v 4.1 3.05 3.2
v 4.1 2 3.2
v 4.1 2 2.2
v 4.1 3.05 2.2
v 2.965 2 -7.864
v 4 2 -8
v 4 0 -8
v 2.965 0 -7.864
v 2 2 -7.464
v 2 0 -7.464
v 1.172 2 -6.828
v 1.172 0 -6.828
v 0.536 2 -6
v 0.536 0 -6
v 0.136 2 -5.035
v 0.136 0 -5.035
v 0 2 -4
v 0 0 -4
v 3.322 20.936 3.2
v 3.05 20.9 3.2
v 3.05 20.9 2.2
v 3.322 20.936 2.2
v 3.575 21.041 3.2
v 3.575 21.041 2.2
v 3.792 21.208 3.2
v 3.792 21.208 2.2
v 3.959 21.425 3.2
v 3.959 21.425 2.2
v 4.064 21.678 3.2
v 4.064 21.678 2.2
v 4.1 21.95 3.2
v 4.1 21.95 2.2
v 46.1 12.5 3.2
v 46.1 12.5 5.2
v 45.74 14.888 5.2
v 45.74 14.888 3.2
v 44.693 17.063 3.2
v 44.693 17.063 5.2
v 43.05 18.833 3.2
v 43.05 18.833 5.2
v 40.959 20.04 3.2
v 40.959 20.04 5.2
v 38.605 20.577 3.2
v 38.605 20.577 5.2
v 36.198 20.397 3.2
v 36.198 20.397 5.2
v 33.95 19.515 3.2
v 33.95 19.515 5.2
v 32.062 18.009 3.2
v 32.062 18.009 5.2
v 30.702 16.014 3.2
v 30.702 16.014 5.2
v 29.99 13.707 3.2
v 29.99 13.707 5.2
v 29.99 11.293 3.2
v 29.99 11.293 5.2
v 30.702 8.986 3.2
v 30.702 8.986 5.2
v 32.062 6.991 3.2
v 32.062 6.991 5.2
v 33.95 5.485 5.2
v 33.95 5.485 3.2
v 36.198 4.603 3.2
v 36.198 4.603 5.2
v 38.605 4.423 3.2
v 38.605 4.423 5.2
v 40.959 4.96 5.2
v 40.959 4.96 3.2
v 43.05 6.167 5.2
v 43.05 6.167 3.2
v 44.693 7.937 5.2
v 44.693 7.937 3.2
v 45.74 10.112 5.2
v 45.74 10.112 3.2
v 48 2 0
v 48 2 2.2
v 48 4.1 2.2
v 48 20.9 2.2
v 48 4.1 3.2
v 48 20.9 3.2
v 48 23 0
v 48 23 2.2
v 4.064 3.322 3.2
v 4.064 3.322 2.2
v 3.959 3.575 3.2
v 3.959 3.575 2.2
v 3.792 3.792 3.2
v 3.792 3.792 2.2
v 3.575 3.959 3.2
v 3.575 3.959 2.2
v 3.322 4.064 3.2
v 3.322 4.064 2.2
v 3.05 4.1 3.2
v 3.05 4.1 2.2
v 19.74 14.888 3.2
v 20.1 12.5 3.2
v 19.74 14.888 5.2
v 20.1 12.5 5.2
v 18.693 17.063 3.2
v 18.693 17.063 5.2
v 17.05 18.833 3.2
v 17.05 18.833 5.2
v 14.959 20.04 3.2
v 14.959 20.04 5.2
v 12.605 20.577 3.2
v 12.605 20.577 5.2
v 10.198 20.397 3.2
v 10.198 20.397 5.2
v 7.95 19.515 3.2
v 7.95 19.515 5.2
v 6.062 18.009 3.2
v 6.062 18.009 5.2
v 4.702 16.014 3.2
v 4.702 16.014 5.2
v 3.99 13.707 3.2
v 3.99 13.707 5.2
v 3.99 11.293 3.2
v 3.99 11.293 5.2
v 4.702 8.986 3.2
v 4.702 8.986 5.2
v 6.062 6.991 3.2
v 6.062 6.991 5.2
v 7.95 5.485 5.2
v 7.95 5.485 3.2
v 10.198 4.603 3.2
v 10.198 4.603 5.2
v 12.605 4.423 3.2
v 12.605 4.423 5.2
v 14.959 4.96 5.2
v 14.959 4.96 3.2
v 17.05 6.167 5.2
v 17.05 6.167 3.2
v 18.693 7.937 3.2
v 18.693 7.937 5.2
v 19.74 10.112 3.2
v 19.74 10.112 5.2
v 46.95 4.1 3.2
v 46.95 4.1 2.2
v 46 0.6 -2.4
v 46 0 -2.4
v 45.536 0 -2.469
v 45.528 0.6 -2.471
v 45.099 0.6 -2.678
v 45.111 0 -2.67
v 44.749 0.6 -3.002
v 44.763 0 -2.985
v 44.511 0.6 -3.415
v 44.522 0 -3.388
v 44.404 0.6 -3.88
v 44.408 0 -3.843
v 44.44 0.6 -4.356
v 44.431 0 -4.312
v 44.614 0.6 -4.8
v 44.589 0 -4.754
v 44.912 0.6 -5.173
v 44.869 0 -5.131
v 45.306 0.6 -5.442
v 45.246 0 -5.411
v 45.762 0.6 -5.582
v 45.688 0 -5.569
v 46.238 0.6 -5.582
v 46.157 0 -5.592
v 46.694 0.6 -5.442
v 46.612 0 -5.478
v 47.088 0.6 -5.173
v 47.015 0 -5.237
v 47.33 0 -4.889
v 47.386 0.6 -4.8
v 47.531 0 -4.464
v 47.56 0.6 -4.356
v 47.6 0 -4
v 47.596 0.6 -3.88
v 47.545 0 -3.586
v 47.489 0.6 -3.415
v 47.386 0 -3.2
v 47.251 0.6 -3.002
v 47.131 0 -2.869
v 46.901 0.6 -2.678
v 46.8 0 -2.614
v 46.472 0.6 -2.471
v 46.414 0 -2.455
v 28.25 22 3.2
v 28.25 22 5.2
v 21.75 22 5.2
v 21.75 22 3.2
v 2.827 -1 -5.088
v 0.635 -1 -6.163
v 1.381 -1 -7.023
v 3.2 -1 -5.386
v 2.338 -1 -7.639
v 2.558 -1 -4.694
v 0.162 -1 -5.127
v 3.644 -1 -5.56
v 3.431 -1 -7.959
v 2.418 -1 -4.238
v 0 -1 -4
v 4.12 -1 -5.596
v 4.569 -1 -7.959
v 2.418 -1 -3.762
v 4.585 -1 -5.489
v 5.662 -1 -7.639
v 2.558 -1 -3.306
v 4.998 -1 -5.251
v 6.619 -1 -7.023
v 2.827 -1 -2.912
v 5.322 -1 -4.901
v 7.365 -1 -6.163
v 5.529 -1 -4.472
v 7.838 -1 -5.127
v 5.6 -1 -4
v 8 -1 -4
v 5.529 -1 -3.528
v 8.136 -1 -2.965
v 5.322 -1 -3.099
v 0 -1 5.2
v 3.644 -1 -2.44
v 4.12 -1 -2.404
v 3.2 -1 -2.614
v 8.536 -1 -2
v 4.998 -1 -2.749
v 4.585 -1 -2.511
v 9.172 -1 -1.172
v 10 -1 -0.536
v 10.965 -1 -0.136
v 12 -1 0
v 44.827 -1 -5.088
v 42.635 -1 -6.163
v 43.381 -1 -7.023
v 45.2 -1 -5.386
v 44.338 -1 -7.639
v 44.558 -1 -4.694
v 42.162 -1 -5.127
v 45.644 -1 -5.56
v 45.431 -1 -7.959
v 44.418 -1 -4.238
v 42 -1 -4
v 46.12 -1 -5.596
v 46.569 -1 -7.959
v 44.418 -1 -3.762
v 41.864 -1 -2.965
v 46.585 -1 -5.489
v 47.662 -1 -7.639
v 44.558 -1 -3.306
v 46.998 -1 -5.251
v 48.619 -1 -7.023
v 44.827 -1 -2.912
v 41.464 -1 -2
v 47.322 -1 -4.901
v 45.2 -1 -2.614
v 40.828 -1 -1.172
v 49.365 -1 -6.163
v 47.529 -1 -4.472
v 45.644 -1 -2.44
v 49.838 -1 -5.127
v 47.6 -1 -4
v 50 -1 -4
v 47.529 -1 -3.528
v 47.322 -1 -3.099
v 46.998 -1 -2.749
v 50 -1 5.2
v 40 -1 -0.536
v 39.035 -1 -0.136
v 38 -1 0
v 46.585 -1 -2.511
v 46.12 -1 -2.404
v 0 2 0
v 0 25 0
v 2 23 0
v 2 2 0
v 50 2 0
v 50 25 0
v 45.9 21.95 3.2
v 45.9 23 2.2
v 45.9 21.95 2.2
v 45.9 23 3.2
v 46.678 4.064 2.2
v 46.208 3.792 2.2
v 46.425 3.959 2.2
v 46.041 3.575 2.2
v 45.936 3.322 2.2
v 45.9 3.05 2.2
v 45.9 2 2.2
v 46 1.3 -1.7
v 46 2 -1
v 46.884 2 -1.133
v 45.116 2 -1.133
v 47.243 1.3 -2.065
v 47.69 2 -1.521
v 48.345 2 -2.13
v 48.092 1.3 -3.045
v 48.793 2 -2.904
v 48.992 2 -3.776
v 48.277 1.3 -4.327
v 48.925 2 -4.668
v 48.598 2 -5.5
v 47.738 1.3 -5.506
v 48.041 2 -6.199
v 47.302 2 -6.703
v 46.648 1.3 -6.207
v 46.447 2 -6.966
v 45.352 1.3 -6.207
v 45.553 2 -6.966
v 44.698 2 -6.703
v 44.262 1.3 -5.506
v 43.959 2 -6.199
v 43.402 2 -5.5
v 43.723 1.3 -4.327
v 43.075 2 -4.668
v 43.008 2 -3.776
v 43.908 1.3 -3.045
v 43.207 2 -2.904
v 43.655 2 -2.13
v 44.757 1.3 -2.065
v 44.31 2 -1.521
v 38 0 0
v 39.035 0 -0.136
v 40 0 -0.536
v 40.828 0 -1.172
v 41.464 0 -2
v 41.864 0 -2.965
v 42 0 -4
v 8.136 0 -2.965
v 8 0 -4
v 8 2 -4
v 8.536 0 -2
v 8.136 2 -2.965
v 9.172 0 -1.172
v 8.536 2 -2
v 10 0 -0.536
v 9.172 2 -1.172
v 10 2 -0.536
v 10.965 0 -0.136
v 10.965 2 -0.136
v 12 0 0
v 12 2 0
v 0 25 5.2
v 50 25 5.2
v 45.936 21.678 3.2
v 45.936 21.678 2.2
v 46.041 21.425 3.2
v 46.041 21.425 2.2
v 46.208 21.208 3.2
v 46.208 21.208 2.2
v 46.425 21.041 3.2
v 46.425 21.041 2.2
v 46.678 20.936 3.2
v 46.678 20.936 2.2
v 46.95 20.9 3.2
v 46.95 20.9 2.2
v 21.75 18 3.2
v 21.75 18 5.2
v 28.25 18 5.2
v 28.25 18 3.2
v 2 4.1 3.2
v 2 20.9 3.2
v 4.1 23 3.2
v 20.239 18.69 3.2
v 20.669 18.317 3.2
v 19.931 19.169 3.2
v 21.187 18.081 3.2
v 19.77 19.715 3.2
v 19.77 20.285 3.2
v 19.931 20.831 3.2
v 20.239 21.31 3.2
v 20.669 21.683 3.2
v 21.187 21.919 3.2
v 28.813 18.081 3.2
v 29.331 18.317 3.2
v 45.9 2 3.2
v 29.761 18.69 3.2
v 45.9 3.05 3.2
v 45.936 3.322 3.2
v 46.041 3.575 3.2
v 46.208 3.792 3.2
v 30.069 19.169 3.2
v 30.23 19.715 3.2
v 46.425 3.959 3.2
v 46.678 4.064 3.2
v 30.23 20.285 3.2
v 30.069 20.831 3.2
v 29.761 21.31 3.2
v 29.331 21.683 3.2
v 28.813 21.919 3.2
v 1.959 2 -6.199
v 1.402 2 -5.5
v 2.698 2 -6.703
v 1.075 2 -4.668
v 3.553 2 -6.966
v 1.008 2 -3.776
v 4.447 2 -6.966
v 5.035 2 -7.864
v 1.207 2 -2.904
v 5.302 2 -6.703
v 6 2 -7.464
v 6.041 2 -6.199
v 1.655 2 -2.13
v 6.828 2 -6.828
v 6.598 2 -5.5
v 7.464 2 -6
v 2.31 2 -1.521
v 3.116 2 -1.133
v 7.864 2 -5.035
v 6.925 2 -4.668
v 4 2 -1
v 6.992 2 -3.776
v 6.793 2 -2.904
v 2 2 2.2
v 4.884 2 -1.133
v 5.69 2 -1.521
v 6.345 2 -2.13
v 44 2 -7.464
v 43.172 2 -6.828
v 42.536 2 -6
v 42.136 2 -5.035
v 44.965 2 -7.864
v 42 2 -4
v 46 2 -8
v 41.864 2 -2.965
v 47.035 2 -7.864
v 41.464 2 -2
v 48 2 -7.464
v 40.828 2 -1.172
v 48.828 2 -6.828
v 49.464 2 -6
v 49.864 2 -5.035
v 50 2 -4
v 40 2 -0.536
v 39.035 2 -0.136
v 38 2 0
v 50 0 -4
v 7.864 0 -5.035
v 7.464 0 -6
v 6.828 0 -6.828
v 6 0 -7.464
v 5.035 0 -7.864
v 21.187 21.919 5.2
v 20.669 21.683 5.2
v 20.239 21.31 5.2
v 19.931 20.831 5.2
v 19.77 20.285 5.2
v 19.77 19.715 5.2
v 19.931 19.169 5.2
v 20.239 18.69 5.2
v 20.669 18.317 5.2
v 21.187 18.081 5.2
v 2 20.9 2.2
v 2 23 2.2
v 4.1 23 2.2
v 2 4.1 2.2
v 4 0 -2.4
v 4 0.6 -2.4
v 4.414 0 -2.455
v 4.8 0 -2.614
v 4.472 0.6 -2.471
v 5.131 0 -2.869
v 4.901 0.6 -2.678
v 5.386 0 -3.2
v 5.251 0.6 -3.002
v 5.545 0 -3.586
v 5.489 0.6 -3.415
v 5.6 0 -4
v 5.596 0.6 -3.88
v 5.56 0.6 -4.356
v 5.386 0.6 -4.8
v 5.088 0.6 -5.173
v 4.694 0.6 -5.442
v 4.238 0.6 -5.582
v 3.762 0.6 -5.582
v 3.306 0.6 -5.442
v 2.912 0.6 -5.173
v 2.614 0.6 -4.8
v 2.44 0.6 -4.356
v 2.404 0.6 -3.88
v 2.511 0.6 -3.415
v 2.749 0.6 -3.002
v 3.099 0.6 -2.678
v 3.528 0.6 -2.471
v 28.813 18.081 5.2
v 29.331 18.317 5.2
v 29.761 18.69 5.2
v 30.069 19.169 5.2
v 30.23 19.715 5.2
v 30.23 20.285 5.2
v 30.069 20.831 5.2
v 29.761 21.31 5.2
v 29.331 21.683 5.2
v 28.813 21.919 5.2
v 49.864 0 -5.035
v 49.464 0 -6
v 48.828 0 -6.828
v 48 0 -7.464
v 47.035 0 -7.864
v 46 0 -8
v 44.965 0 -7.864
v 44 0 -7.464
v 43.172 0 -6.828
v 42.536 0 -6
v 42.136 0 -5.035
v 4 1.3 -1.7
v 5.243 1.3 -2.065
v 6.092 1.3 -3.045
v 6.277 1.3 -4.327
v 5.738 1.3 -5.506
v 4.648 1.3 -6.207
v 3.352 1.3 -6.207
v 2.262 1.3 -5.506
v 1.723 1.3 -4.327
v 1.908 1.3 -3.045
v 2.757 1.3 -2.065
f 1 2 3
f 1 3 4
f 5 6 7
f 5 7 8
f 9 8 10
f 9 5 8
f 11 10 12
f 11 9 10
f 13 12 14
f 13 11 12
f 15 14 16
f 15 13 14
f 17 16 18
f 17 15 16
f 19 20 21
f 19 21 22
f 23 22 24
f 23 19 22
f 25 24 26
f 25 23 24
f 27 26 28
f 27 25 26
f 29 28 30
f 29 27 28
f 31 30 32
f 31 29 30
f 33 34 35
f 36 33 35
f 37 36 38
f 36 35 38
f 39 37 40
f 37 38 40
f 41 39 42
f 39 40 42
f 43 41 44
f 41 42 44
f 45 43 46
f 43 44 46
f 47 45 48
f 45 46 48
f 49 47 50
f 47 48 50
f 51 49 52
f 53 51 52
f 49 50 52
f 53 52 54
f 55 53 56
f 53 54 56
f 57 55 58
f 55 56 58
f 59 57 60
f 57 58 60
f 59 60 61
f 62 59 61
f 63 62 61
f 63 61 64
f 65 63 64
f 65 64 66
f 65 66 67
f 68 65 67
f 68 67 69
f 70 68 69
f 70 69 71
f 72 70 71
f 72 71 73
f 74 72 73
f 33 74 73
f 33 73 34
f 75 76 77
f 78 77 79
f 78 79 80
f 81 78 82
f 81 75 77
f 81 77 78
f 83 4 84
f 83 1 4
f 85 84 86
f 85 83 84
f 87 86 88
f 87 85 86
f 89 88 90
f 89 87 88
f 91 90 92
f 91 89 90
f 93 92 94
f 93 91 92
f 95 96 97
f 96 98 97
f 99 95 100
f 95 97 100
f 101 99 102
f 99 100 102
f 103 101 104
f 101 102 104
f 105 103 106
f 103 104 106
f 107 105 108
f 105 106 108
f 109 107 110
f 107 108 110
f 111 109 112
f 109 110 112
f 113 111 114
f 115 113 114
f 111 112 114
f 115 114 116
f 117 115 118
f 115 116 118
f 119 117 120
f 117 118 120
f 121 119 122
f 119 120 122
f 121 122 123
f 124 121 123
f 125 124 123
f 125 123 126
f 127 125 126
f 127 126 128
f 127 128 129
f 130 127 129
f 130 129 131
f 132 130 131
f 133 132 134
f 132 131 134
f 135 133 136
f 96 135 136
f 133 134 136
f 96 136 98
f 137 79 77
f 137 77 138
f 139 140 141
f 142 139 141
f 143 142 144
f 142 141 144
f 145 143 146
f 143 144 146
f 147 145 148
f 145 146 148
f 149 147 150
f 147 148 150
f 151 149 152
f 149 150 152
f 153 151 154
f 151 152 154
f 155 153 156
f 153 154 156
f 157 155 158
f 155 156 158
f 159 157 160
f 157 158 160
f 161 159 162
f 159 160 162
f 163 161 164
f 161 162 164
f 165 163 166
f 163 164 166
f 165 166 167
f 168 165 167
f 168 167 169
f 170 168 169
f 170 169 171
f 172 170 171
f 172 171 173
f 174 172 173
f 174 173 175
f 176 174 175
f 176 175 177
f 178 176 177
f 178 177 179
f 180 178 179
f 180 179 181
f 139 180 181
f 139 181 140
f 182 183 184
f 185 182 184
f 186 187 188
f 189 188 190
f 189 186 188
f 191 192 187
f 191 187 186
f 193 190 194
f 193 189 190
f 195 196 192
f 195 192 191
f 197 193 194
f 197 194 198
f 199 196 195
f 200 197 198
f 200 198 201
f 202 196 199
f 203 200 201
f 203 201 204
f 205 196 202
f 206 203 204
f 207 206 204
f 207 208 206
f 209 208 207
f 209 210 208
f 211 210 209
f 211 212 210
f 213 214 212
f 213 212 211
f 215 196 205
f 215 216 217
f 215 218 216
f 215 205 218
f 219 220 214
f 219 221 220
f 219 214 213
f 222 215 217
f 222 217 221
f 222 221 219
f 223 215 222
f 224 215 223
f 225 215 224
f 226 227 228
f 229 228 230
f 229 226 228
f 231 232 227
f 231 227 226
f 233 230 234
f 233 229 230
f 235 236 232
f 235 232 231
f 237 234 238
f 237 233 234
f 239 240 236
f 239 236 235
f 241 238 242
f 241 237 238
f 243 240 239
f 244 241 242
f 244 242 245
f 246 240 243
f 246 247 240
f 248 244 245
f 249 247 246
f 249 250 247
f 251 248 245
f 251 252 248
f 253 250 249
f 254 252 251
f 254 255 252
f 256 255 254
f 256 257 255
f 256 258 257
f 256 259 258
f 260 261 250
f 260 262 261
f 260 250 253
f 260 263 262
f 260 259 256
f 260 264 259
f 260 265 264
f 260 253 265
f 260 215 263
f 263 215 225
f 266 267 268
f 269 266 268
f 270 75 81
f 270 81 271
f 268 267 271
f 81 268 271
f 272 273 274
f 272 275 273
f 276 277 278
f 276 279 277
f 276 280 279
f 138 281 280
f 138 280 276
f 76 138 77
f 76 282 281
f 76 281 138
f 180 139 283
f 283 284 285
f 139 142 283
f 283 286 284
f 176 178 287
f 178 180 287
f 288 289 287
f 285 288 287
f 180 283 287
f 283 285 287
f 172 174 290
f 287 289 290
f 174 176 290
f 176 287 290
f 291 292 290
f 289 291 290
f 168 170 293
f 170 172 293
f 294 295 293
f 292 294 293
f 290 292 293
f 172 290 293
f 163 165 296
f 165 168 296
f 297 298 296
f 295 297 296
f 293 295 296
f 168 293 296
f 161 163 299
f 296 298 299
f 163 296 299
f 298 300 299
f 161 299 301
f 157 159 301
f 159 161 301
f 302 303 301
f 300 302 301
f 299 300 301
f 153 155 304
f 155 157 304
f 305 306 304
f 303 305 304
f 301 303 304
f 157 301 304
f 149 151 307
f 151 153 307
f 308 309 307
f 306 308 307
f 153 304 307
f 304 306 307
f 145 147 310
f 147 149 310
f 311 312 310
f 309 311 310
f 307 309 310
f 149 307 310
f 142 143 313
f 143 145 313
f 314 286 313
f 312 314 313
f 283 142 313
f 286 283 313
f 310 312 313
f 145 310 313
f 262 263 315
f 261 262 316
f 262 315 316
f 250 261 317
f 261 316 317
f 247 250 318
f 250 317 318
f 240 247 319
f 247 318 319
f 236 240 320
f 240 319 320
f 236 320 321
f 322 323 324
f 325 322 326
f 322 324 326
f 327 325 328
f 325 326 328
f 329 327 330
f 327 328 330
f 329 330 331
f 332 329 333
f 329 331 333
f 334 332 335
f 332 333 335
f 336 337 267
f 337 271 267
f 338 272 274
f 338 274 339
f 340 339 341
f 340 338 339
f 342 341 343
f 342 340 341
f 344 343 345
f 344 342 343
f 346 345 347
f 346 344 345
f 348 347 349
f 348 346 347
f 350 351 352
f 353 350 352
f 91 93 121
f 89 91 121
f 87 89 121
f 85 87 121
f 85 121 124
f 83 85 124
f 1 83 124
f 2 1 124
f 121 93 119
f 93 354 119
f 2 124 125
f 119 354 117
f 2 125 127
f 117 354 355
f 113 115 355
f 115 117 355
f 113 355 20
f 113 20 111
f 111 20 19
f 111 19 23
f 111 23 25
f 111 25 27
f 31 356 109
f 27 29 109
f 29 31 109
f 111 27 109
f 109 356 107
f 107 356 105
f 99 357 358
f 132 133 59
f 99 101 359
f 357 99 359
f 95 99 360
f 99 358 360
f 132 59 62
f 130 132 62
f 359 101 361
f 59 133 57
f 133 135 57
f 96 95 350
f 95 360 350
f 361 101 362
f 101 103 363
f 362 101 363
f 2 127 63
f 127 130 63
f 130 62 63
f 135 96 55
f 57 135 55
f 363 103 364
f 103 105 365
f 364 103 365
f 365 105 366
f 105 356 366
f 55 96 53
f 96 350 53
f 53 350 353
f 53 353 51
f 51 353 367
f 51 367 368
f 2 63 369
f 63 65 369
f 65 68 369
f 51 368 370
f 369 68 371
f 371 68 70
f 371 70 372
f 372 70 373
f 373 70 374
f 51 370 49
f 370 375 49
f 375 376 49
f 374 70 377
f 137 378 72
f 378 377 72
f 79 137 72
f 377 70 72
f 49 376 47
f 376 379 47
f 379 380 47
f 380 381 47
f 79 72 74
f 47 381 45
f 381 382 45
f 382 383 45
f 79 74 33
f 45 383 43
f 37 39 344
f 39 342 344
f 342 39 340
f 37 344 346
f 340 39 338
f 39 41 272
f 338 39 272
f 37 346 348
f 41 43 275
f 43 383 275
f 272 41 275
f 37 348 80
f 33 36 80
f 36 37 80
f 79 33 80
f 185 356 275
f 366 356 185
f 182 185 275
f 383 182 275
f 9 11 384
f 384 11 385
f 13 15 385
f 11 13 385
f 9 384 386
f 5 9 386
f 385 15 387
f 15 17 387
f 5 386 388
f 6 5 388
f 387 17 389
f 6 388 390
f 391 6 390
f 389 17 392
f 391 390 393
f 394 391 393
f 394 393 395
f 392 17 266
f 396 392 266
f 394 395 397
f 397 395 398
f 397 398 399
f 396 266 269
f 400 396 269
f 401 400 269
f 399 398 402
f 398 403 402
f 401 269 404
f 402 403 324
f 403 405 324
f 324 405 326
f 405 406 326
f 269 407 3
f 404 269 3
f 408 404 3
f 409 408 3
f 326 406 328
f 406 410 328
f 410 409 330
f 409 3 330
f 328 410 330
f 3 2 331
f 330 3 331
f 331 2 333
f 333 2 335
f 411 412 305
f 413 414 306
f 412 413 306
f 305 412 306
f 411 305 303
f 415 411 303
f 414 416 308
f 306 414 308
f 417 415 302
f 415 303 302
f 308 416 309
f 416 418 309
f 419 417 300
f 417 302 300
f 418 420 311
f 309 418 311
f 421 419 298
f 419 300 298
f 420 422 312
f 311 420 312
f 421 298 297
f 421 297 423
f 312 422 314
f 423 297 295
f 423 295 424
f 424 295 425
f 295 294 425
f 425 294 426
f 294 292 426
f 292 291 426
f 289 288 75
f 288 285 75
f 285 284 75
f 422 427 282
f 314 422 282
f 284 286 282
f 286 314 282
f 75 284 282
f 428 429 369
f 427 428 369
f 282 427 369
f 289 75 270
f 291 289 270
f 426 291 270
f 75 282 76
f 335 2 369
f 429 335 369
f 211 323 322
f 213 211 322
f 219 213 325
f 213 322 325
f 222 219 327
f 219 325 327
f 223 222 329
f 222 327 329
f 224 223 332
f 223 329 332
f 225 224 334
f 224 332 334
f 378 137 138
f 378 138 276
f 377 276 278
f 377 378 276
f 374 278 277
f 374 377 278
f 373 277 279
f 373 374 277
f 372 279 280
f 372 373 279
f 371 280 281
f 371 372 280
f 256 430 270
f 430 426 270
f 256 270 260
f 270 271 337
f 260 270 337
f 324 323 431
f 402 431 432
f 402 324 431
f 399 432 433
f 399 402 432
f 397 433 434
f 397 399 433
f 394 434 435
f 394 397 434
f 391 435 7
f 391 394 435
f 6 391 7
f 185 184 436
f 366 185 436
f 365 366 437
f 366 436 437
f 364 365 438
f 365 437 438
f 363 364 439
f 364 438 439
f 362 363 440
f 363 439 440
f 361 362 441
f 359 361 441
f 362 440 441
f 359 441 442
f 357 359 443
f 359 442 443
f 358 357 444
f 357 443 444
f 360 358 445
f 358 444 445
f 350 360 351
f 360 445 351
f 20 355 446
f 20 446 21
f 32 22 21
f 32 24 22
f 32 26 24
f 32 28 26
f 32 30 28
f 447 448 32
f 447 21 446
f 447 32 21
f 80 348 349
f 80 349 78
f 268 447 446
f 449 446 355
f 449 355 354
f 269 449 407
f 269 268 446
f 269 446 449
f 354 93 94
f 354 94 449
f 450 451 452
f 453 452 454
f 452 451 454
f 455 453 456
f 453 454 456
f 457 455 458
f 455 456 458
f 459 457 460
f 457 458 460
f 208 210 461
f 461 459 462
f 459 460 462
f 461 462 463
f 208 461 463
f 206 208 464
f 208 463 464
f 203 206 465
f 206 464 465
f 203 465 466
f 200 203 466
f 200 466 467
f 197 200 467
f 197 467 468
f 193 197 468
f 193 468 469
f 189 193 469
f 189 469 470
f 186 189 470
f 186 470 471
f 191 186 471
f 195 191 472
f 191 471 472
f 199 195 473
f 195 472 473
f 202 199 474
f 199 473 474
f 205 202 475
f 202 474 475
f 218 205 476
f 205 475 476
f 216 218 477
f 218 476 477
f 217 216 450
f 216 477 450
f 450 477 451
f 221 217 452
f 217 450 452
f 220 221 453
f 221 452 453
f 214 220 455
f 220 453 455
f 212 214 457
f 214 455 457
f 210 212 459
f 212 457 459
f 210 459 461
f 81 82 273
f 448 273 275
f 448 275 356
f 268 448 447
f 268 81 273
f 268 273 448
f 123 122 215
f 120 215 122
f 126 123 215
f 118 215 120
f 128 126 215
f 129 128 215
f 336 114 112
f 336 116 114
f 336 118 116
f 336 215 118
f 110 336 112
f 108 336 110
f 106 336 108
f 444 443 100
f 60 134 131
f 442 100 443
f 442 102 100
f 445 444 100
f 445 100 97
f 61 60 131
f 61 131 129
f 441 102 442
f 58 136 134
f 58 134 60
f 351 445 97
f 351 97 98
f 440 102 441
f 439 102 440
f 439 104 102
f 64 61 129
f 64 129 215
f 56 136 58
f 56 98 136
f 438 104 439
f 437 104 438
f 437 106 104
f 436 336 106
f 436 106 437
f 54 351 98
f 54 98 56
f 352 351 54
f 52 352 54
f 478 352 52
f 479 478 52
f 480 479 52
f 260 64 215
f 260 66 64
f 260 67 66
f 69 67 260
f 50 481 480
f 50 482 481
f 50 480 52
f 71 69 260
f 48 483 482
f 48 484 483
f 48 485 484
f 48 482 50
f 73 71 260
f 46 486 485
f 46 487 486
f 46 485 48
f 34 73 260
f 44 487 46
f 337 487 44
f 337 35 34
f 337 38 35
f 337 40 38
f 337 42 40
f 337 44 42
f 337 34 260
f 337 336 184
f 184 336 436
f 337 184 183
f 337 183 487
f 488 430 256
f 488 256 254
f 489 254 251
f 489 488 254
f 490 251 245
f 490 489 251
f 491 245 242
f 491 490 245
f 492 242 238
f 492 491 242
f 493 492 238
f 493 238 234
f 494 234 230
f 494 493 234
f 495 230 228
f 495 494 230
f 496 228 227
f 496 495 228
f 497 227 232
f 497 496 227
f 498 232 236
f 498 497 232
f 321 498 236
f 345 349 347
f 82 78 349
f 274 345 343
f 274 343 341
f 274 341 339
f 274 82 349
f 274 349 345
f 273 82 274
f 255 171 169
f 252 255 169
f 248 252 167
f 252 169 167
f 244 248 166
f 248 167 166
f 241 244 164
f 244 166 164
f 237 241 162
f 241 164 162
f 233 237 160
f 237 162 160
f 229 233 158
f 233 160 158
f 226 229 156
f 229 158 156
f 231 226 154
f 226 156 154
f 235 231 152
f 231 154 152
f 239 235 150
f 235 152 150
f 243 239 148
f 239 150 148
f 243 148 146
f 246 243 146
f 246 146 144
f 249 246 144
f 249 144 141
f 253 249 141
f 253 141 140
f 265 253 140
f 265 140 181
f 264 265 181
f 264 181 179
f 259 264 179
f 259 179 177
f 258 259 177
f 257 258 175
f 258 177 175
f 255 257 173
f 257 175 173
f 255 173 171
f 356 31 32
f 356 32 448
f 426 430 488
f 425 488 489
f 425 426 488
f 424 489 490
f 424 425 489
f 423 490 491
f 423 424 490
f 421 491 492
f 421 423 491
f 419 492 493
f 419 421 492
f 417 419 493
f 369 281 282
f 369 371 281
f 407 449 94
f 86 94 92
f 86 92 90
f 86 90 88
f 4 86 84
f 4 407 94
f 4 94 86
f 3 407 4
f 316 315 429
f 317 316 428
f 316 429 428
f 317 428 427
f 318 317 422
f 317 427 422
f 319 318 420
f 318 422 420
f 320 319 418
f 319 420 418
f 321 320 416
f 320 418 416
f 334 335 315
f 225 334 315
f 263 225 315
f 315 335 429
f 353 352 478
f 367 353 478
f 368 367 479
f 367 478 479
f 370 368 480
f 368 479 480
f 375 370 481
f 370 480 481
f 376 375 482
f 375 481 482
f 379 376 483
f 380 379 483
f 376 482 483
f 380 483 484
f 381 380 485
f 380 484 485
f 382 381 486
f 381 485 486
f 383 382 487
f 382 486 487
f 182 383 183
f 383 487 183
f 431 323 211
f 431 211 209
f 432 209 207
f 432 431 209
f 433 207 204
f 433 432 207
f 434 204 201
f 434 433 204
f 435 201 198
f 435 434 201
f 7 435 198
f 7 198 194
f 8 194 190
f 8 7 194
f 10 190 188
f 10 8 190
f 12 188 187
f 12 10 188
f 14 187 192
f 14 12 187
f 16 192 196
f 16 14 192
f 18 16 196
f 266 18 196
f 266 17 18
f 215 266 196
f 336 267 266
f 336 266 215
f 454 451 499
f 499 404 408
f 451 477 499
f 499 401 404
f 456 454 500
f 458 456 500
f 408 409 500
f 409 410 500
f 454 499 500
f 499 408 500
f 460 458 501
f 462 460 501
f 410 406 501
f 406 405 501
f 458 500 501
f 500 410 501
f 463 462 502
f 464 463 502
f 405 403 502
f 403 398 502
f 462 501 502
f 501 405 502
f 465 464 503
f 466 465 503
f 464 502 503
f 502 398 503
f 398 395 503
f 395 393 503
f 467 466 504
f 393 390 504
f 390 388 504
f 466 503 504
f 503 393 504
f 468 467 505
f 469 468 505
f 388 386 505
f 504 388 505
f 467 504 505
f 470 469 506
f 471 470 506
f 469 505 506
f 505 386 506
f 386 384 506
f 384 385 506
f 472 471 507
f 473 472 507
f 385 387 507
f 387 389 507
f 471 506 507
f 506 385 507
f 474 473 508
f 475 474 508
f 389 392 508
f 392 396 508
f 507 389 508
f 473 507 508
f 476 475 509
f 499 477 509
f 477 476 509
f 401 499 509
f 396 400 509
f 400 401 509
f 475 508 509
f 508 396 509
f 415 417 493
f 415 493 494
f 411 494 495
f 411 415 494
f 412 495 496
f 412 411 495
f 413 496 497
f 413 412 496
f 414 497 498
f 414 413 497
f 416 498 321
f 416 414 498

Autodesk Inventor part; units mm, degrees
sketch "Эскиз1" plane through (0, 0, 0) normal (0, 0, 1) x (1, 0, 0)
  line L0 (0, 0) -> (50, 0)
  line L1 (50, 0) -> (50, 25)
  line L2 (50, 25) -> (0, 25)
  line L3 (0, 25) -> (0, 0)
  dimension "d0" = 50
  dimension "d1" = 25
extrude "Выдавливание1" add sketch "Эскиз1" along normal blind 5.2
shell "Оболочка1" thickness 2 removed faces 1 at (16.6667, 16.6667, 0)
sketch "Эскиз2" plane through (0, 0, 5.2) normal (0, 0, 1) x (1, 0, 0)
  line L0 (50, 25) -> (0, 25) projected
  line L1 (25, 25) -> (25, 0)
  line L2 (0, 0) -> (50, 0) projected
  line L3 (25, 12.5) -> (12, 12.5)
  line L4 (0, 25) -> (0, 0) projected
  circle A0 centre (12, 12.5) radius 8.1
  circle A1 centre (38, 12.5) radius 8.1
  line L5 (25, 25) -> (25, 20)
  line L6 (21.75, 20) -> (28.25, 20) construction
  line L7 (21.75, 18) -> (28.25, 18)
  line L8 (28.25, 22) -> (21.75, 22)
  arc A2 (21.75, 22) -> (21.75, 18) centre (21.75, 20) ccw
  arc A3 (28.25, 18) -> (28.25, 22) centre (28.25, 20) ccw
  point P0 (25, 18)
  point P1 (25, 22)
  dimension "d5" = 13
  dimension "d6" = 16.2
  dimension "d9" = 5
  dimension "d10" = 3.25
  dimension "d11" = 4
extrude "Выдавливание2" cut sketch "Эскиз2" against normal through all contours L8 A3 L7 L1 | L1 L7 A2 L8 | A0 | A1
sketch "Эскиз5" plane through (48, 23, 3.2) normal (0, 0, -1) x (-1, 0, 0)
  line L0 (0, 0) -> (1.05, 0)
  line L1 (0, 0) -> (46, 0) projected
  line L2 (1.05, 0) -> (1.05, -1.05)
  circle A0 centre (1.05, -1.05) radius 1.05
  line L3 (2.1, -2.1) -> (0, -2.1)
  line L4 (0, -2.1) -> (0, 0)
  line L5 (0, 0) -> (2.1, 0)
  line L6 (2.1, 0) -> (2.1, -2.1)
  line L7 (2.1, -2.1) -> (0, 0) construction
  line L8 (0, -2.1) -> (2.1, 0) construction
  point P0 (48, -23)
  point P1 (1.05, -2.1)
  point P2 (2.1, -1.05)
  dimension "d17" = 1.05
  dimension "d18" = 1.05
extrude "Выдавливание4" add sketch "Эскиз5" along normal blind 1 contours L0 A0 L4 | L1 L6 A0 | A0 | A0 L3 L4
ref_plane "РабПлоскость1" through (25, 2, 0) normal (1, 0, 0) x (0, 0, -1)
ref_plane "РабПлоскость2" through (2, 12.5, 0) normal (0, -1, 0) x (1, 0, 0)
mirror "Зеркальное отражение1" about plane through (2, 12.5, 0) normal (0, -1, 0) of "Выдавливание4"
mirror "Зеркальное отражение2" about plane through (25, 2, 0) normal (1, 0, 0) of "Выдавливание4", "Зеркальное отражение1"
sketch "Эскиз10" plane through (0, 0, 0) normal (0, -1, 0) x (1, 0, 0)
  line L0 (0, 0) -> (50, 0) projected
  line L1 (50, 0) -> (42, 0)
  line L2 (42, 0) -> (42, -8)
  line L3 (42, -8) -> (50, -8)
  line L4 (50, -8) -> (50, 0)
  dimension "d39" = 8
  dimension "d40" = 8
extrude "Выдавливание8" add sketch "Эскиз10" against normal up to surface (2 mm away)
sketch "Эскиз11" plane through (48, 2, 0) normal (0, 1, 0) x (1, 0, 0)
  line L0 (-6, 0) -> (-6, 8) projected
  line L1 (-6, 4) -> (2, 4)
  line L2 (2, 0) -> (2, 8) projected
  line L3 (-6, 8) -> (-6, 0) projected
  point P0 (-48, 0)
  point P1 (-2, 4)
hole "Отверстие2" at (46, 2, -4) direction (0, -1, 0) diameter 3.2 end through all countersink diameter 6 countersink angle 90
ref_plane "РабПлоскость3" through (25, 25, 5.2) normal (1, 0, 0) x (0, 0, -1)
mirror "Зеркальное отражение4" about plane through (25, 25, 5.2) normal (1, 0, 0) of "Отверстие2", "Выдавливание8"
fillet "Сопряжение2" radius 4 6 edges at (42, 1, -8) (50, 1, -8) (8, 1, -8) (0, 1, -8) (8, 1, 0) (42, 1, 0)
sketch "Эскиз12" plane through (0, 0, 5.2) normal (0, -1, 0) x (1, 0, 0)
  circle A0 centre (46, -9.2) radius 1.6 projected
  circle A1 centre (4, -9.2) radius 1.6 projected
  arc A2 (0, -9.2) -> (8, -9.2) centre (4, -9.2) ccw projected
  arc A3 (12, -5.2) -> (8, -9.2) centre (12, -9.2) ccw projected
  line L0 (12, -5.2) -> (38, -5.2) projected
  arc A4 (42, -9.2) -> (38, -5.2) centre (38, -9.2) ccw projected
  arc A5 (42, -9.2) -> (50, -9.2) centre (46, -9.2) ccw projected
  line L1 (50, -9.2) -> (50, 0) projected
  line L2 (0, 0) -> (50, 0) projected
  line L3 (0, -9.2) -> (0, 0) projected
  point P0 (0, -5.2)
extrude "Выдавливание9" add sketch "Эскиз12" along normal blind 1
properties part number "Крепление ультрасоника"
